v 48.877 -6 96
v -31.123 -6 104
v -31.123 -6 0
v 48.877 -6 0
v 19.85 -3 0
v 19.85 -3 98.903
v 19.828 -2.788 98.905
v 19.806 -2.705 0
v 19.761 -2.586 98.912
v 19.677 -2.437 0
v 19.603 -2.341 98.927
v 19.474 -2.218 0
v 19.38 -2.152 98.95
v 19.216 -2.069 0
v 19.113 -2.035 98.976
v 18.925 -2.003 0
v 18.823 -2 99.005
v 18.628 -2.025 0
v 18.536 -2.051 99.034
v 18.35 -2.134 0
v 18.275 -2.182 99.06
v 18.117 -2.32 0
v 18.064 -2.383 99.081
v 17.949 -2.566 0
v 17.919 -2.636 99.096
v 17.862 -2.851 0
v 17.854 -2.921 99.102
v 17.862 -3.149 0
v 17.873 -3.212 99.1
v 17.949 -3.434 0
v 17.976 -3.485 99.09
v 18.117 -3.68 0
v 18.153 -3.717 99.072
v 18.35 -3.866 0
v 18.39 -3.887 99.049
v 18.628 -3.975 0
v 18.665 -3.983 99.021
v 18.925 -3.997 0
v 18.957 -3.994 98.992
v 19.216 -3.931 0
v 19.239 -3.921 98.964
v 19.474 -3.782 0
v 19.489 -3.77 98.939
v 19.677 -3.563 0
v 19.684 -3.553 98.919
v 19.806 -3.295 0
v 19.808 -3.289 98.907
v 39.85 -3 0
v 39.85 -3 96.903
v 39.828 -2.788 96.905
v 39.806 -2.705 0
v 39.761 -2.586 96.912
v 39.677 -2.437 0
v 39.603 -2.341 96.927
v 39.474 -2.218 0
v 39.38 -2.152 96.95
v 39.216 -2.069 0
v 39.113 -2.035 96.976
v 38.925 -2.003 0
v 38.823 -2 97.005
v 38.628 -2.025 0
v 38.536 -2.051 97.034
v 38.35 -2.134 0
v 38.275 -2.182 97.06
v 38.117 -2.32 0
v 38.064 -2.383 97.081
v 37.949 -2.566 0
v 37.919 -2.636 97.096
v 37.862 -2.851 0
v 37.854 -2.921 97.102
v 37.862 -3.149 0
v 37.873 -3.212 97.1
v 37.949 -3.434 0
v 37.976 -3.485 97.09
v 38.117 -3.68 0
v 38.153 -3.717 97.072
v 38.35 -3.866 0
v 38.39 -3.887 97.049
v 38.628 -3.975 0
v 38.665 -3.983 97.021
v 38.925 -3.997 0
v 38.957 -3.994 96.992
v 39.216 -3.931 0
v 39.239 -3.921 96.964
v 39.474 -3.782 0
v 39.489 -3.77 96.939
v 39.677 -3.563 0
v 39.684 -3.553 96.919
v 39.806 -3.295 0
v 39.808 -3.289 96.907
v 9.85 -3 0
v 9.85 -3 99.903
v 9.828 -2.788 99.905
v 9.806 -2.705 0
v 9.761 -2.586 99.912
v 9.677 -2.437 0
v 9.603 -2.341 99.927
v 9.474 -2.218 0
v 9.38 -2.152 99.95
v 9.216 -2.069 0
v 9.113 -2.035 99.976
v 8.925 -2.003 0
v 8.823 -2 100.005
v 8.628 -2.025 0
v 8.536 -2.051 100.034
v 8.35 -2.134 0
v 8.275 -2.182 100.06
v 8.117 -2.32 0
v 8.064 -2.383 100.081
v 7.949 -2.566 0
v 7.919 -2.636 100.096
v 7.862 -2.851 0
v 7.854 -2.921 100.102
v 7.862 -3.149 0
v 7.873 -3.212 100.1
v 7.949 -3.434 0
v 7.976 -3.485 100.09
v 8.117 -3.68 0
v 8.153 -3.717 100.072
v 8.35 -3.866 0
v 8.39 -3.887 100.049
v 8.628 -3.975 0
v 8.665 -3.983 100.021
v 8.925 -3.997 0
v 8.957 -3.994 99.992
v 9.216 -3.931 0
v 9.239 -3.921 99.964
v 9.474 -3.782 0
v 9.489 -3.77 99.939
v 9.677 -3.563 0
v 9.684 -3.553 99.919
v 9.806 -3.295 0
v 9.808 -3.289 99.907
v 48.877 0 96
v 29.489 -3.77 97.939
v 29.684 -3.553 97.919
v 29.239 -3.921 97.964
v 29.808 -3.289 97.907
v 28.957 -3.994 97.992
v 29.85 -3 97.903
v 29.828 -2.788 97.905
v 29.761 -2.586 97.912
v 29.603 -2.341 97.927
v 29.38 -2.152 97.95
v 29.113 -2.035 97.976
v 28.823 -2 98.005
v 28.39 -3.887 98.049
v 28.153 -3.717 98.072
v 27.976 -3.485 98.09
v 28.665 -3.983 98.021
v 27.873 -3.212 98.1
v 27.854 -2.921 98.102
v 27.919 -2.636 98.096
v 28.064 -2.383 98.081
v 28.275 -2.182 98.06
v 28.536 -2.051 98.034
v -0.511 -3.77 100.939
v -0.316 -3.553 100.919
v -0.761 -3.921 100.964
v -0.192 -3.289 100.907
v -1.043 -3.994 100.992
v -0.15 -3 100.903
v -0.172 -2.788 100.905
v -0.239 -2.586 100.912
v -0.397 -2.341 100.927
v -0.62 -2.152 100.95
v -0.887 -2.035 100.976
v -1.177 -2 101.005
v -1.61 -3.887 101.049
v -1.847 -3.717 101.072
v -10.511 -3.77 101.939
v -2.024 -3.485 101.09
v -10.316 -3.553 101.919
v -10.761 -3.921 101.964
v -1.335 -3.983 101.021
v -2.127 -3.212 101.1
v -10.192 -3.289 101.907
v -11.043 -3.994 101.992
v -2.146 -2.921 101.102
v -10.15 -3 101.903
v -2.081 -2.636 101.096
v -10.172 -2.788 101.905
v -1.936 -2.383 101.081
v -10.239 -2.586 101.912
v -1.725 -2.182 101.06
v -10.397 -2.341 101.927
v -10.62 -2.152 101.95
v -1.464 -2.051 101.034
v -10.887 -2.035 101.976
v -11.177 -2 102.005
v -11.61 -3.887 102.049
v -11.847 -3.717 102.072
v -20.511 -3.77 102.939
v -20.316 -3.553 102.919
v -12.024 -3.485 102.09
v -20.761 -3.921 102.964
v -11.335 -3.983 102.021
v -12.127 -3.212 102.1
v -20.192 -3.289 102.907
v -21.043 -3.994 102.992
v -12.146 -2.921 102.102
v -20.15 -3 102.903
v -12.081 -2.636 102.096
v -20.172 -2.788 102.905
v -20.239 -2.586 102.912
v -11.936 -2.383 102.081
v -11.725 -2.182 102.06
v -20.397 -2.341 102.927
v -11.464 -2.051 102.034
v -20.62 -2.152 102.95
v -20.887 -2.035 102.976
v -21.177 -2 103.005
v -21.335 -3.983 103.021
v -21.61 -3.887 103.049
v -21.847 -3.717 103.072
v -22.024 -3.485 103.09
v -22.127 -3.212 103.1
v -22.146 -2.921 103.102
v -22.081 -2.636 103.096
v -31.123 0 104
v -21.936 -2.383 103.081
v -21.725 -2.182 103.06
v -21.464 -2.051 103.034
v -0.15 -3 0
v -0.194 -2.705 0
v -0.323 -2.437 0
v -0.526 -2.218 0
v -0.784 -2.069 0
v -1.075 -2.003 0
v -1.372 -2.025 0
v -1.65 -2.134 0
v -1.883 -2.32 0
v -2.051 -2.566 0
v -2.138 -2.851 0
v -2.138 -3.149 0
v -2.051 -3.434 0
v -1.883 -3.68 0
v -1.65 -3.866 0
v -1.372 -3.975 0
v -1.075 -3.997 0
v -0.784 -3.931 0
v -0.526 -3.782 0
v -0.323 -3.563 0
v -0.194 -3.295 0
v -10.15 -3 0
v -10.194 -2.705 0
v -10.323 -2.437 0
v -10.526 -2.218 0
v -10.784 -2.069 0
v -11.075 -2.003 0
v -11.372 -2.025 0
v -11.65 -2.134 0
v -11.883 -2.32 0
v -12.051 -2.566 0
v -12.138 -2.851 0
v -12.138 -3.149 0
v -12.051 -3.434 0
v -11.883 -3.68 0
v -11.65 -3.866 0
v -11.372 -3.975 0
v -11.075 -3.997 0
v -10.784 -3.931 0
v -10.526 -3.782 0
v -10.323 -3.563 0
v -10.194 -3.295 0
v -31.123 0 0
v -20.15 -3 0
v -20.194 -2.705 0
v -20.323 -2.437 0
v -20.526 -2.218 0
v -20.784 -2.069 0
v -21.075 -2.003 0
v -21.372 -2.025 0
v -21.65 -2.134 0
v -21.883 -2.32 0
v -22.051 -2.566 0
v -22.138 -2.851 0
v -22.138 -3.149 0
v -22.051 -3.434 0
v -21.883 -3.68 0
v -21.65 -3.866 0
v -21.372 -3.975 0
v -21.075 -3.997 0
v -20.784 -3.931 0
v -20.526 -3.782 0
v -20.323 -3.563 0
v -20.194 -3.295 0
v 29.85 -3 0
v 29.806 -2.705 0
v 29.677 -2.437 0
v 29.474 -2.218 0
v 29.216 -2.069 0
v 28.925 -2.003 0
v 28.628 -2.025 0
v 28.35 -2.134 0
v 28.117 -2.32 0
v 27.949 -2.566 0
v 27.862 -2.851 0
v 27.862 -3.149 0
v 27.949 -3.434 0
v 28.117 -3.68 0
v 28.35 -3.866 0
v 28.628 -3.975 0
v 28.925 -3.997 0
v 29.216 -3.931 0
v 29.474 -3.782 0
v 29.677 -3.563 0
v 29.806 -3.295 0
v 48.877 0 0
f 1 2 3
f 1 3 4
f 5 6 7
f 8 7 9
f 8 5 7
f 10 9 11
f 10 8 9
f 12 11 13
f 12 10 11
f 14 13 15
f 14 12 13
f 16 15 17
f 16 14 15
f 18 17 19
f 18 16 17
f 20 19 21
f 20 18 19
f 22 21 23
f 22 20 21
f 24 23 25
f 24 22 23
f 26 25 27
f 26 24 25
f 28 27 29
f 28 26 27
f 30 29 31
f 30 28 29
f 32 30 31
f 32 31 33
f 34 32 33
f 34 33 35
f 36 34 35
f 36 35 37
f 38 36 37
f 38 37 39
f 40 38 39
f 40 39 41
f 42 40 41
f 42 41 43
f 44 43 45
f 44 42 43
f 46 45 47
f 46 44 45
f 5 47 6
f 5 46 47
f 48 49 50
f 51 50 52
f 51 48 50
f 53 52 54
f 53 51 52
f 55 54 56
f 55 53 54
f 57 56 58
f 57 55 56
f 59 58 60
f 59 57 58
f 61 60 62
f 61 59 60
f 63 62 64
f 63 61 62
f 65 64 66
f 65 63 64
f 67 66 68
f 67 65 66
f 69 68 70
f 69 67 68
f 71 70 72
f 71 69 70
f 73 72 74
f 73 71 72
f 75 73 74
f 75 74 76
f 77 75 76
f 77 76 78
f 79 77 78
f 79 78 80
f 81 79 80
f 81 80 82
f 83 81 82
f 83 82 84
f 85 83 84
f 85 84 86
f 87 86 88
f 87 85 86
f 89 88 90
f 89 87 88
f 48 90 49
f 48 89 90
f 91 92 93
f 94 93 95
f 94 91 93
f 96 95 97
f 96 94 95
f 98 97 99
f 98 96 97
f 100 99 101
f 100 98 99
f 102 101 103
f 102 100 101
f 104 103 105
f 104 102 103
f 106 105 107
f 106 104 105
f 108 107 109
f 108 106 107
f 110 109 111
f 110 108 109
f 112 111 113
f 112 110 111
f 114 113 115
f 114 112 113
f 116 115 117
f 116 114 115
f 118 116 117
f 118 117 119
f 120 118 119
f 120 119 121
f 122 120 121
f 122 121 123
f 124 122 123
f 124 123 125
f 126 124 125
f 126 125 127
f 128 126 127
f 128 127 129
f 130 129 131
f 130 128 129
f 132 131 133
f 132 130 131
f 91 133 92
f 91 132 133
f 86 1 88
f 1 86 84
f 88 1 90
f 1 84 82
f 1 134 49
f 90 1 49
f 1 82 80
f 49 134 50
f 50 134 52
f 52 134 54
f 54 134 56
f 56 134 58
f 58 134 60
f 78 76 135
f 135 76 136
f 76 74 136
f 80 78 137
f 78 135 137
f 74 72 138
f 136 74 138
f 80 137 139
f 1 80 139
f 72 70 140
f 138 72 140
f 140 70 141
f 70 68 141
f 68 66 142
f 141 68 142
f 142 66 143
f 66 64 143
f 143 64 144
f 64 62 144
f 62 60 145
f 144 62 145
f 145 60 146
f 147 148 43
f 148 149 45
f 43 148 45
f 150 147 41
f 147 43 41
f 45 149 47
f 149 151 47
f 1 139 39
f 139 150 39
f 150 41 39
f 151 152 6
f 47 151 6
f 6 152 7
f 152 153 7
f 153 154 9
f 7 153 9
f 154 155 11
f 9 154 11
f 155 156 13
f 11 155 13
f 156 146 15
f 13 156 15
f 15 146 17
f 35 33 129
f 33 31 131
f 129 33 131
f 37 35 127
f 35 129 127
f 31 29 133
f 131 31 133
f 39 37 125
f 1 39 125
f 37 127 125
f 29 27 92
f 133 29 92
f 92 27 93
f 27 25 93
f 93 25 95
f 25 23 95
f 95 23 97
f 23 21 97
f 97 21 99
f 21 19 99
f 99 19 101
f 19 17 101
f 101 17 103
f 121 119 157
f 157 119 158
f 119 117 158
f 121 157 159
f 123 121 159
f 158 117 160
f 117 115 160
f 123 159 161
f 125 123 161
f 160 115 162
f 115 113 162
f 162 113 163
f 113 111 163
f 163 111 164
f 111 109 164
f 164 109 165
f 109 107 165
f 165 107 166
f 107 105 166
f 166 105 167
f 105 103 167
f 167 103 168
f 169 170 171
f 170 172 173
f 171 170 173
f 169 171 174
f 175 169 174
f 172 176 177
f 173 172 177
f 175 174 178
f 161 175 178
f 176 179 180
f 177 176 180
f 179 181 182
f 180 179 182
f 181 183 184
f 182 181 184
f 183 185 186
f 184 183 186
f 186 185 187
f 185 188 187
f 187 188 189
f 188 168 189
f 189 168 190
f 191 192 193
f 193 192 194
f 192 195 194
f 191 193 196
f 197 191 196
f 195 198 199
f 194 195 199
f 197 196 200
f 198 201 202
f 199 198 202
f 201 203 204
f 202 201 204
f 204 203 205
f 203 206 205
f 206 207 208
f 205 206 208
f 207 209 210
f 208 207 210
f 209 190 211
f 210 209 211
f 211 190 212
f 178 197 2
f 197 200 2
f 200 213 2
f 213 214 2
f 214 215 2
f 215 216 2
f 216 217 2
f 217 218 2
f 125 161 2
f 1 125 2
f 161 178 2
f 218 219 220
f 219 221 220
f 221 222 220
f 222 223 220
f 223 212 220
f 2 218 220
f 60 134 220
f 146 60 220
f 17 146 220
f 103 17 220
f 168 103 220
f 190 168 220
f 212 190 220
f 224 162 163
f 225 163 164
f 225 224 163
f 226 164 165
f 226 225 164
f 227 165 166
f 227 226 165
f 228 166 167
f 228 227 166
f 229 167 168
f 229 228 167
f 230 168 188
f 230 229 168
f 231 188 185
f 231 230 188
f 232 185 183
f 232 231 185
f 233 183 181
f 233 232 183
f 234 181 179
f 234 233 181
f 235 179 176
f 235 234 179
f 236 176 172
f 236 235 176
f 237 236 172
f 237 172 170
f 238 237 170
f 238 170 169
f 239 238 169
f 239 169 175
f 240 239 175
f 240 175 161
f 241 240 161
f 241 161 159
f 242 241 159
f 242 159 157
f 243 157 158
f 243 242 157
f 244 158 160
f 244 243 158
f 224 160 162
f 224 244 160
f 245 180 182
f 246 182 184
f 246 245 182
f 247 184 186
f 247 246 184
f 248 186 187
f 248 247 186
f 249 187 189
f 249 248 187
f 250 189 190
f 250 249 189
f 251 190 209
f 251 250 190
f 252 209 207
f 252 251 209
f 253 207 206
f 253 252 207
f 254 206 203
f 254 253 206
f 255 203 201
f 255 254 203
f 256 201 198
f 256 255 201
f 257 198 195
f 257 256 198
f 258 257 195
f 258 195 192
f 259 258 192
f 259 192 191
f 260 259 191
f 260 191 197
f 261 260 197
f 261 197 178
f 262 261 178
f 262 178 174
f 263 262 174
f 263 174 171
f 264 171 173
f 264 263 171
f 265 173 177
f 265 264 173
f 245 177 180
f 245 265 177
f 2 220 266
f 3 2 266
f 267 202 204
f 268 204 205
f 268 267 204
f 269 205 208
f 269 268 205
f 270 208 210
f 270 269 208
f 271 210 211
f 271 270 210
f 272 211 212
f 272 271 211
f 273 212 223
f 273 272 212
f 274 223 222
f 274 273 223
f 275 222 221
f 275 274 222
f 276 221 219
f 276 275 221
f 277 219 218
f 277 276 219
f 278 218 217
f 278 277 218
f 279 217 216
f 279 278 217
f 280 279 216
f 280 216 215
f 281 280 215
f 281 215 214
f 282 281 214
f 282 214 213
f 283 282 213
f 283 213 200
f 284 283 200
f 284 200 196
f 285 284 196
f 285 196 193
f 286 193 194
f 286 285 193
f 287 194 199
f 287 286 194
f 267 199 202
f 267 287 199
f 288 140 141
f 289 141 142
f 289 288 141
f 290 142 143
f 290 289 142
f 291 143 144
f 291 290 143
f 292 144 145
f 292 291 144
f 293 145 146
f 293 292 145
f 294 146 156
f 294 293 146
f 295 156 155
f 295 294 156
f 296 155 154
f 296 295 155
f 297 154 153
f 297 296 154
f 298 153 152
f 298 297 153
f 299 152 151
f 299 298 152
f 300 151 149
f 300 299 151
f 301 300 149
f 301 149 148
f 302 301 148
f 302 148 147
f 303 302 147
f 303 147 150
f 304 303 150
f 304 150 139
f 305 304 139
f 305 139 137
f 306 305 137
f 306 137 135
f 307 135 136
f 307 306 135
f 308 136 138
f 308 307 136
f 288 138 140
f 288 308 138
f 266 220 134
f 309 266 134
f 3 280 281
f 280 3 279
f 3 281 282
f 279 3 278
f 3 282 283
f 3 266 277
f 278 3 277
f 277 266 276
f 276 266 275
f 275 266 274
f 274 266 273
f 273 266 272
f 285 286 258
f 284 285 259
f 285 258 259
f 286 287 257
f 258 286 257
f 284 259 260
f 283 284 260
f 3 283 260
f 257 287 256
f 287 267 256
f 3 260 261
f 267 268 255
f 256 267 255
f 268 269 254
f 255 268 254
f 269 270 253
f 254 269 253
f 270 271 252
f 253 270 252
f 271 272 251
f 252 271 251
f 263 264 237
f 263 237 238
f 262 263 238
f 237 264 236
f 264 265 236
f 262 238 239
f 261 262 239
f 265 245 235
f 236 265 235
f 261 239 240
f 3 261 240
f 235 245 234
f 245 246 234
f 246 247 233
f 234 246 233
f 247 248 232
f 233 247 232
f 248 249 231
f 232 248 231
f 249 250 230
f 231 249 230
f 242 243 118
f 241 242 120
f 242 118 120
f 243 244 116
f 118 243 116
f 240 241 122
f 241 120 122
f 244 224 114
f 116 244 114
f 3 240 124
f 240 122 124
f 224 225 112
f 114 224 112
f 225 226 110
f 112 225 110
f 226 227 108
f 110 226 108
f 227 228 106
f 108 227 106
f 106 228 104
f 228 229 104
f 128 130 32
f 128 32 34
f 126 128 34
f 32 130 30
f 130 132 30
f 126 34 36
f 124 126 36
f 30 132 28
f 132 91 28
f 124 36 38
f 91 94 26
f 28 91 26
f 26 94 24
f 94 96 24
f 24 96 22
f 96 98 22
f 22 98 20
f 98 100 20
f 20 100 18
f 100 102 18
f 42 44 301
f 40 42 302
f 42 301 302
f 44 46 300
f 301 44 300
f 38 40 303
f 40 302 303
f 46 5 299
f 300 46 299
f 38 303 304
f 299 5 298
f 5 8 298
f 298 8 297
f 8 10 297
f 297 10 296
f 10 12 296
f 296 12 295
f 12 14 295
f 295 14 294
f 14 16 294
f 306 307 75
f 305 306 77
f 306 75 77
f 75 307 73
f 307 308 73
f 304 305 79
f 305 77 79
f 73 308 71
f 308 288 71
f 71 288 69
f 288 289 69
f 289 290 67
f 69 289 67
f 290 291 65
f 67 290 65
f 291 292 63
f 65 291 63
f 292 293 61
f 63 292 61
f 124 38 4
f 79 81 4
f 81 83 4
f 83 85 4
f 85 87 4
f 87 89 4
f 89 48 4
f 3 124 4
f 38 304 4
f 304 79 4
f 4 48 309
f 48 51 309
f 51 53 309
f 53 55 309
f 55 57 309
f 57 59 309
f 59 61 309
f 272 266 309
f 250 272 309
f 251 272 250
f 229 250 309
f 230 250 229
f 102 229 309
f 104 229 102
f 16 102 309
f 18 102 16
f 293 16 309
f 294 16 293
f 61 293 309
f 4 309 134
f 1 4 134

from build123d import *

# Parameters (mm, degrees)
F1_DEPTH = 6
F2_R     = 1
F3_DEPTH = 110


with BuildPart() as f1:
    # F0 (on Front) → F1 (new body)
    with BuildSketch(Plane.XZ):
        Polygon((-31.122757, 104), (-31.122757, 0), (48.877243, 0), (48.877243, 96), align=None)
    extrude(amount=F1_DEPTH)

    # F2 (on Top) → F3 (cut)
    with BuildSketch(Plane.XY):
        with Locations((-21.149542, -3)):
            Circle(F2_R)
        with Locations((-11.149542, -3)):
            Circle(F2_R)
        with Locations((-1.149542, -3)):
            Circle(F2_R)
        with Locations((8.850458, -3)):
            Circle(F2_R)
        with Locations((18.850458, -3)):
            Circle(F2_R)
        with Locations((28.850458, -3)):
            Circle(F2_R)
        with Locations((38.850458, -3)):
            Circle(F2_R)
    extrude(amount=F3_DEPTH, mode=Mode.SUBTRACT)


solid = f1.part
